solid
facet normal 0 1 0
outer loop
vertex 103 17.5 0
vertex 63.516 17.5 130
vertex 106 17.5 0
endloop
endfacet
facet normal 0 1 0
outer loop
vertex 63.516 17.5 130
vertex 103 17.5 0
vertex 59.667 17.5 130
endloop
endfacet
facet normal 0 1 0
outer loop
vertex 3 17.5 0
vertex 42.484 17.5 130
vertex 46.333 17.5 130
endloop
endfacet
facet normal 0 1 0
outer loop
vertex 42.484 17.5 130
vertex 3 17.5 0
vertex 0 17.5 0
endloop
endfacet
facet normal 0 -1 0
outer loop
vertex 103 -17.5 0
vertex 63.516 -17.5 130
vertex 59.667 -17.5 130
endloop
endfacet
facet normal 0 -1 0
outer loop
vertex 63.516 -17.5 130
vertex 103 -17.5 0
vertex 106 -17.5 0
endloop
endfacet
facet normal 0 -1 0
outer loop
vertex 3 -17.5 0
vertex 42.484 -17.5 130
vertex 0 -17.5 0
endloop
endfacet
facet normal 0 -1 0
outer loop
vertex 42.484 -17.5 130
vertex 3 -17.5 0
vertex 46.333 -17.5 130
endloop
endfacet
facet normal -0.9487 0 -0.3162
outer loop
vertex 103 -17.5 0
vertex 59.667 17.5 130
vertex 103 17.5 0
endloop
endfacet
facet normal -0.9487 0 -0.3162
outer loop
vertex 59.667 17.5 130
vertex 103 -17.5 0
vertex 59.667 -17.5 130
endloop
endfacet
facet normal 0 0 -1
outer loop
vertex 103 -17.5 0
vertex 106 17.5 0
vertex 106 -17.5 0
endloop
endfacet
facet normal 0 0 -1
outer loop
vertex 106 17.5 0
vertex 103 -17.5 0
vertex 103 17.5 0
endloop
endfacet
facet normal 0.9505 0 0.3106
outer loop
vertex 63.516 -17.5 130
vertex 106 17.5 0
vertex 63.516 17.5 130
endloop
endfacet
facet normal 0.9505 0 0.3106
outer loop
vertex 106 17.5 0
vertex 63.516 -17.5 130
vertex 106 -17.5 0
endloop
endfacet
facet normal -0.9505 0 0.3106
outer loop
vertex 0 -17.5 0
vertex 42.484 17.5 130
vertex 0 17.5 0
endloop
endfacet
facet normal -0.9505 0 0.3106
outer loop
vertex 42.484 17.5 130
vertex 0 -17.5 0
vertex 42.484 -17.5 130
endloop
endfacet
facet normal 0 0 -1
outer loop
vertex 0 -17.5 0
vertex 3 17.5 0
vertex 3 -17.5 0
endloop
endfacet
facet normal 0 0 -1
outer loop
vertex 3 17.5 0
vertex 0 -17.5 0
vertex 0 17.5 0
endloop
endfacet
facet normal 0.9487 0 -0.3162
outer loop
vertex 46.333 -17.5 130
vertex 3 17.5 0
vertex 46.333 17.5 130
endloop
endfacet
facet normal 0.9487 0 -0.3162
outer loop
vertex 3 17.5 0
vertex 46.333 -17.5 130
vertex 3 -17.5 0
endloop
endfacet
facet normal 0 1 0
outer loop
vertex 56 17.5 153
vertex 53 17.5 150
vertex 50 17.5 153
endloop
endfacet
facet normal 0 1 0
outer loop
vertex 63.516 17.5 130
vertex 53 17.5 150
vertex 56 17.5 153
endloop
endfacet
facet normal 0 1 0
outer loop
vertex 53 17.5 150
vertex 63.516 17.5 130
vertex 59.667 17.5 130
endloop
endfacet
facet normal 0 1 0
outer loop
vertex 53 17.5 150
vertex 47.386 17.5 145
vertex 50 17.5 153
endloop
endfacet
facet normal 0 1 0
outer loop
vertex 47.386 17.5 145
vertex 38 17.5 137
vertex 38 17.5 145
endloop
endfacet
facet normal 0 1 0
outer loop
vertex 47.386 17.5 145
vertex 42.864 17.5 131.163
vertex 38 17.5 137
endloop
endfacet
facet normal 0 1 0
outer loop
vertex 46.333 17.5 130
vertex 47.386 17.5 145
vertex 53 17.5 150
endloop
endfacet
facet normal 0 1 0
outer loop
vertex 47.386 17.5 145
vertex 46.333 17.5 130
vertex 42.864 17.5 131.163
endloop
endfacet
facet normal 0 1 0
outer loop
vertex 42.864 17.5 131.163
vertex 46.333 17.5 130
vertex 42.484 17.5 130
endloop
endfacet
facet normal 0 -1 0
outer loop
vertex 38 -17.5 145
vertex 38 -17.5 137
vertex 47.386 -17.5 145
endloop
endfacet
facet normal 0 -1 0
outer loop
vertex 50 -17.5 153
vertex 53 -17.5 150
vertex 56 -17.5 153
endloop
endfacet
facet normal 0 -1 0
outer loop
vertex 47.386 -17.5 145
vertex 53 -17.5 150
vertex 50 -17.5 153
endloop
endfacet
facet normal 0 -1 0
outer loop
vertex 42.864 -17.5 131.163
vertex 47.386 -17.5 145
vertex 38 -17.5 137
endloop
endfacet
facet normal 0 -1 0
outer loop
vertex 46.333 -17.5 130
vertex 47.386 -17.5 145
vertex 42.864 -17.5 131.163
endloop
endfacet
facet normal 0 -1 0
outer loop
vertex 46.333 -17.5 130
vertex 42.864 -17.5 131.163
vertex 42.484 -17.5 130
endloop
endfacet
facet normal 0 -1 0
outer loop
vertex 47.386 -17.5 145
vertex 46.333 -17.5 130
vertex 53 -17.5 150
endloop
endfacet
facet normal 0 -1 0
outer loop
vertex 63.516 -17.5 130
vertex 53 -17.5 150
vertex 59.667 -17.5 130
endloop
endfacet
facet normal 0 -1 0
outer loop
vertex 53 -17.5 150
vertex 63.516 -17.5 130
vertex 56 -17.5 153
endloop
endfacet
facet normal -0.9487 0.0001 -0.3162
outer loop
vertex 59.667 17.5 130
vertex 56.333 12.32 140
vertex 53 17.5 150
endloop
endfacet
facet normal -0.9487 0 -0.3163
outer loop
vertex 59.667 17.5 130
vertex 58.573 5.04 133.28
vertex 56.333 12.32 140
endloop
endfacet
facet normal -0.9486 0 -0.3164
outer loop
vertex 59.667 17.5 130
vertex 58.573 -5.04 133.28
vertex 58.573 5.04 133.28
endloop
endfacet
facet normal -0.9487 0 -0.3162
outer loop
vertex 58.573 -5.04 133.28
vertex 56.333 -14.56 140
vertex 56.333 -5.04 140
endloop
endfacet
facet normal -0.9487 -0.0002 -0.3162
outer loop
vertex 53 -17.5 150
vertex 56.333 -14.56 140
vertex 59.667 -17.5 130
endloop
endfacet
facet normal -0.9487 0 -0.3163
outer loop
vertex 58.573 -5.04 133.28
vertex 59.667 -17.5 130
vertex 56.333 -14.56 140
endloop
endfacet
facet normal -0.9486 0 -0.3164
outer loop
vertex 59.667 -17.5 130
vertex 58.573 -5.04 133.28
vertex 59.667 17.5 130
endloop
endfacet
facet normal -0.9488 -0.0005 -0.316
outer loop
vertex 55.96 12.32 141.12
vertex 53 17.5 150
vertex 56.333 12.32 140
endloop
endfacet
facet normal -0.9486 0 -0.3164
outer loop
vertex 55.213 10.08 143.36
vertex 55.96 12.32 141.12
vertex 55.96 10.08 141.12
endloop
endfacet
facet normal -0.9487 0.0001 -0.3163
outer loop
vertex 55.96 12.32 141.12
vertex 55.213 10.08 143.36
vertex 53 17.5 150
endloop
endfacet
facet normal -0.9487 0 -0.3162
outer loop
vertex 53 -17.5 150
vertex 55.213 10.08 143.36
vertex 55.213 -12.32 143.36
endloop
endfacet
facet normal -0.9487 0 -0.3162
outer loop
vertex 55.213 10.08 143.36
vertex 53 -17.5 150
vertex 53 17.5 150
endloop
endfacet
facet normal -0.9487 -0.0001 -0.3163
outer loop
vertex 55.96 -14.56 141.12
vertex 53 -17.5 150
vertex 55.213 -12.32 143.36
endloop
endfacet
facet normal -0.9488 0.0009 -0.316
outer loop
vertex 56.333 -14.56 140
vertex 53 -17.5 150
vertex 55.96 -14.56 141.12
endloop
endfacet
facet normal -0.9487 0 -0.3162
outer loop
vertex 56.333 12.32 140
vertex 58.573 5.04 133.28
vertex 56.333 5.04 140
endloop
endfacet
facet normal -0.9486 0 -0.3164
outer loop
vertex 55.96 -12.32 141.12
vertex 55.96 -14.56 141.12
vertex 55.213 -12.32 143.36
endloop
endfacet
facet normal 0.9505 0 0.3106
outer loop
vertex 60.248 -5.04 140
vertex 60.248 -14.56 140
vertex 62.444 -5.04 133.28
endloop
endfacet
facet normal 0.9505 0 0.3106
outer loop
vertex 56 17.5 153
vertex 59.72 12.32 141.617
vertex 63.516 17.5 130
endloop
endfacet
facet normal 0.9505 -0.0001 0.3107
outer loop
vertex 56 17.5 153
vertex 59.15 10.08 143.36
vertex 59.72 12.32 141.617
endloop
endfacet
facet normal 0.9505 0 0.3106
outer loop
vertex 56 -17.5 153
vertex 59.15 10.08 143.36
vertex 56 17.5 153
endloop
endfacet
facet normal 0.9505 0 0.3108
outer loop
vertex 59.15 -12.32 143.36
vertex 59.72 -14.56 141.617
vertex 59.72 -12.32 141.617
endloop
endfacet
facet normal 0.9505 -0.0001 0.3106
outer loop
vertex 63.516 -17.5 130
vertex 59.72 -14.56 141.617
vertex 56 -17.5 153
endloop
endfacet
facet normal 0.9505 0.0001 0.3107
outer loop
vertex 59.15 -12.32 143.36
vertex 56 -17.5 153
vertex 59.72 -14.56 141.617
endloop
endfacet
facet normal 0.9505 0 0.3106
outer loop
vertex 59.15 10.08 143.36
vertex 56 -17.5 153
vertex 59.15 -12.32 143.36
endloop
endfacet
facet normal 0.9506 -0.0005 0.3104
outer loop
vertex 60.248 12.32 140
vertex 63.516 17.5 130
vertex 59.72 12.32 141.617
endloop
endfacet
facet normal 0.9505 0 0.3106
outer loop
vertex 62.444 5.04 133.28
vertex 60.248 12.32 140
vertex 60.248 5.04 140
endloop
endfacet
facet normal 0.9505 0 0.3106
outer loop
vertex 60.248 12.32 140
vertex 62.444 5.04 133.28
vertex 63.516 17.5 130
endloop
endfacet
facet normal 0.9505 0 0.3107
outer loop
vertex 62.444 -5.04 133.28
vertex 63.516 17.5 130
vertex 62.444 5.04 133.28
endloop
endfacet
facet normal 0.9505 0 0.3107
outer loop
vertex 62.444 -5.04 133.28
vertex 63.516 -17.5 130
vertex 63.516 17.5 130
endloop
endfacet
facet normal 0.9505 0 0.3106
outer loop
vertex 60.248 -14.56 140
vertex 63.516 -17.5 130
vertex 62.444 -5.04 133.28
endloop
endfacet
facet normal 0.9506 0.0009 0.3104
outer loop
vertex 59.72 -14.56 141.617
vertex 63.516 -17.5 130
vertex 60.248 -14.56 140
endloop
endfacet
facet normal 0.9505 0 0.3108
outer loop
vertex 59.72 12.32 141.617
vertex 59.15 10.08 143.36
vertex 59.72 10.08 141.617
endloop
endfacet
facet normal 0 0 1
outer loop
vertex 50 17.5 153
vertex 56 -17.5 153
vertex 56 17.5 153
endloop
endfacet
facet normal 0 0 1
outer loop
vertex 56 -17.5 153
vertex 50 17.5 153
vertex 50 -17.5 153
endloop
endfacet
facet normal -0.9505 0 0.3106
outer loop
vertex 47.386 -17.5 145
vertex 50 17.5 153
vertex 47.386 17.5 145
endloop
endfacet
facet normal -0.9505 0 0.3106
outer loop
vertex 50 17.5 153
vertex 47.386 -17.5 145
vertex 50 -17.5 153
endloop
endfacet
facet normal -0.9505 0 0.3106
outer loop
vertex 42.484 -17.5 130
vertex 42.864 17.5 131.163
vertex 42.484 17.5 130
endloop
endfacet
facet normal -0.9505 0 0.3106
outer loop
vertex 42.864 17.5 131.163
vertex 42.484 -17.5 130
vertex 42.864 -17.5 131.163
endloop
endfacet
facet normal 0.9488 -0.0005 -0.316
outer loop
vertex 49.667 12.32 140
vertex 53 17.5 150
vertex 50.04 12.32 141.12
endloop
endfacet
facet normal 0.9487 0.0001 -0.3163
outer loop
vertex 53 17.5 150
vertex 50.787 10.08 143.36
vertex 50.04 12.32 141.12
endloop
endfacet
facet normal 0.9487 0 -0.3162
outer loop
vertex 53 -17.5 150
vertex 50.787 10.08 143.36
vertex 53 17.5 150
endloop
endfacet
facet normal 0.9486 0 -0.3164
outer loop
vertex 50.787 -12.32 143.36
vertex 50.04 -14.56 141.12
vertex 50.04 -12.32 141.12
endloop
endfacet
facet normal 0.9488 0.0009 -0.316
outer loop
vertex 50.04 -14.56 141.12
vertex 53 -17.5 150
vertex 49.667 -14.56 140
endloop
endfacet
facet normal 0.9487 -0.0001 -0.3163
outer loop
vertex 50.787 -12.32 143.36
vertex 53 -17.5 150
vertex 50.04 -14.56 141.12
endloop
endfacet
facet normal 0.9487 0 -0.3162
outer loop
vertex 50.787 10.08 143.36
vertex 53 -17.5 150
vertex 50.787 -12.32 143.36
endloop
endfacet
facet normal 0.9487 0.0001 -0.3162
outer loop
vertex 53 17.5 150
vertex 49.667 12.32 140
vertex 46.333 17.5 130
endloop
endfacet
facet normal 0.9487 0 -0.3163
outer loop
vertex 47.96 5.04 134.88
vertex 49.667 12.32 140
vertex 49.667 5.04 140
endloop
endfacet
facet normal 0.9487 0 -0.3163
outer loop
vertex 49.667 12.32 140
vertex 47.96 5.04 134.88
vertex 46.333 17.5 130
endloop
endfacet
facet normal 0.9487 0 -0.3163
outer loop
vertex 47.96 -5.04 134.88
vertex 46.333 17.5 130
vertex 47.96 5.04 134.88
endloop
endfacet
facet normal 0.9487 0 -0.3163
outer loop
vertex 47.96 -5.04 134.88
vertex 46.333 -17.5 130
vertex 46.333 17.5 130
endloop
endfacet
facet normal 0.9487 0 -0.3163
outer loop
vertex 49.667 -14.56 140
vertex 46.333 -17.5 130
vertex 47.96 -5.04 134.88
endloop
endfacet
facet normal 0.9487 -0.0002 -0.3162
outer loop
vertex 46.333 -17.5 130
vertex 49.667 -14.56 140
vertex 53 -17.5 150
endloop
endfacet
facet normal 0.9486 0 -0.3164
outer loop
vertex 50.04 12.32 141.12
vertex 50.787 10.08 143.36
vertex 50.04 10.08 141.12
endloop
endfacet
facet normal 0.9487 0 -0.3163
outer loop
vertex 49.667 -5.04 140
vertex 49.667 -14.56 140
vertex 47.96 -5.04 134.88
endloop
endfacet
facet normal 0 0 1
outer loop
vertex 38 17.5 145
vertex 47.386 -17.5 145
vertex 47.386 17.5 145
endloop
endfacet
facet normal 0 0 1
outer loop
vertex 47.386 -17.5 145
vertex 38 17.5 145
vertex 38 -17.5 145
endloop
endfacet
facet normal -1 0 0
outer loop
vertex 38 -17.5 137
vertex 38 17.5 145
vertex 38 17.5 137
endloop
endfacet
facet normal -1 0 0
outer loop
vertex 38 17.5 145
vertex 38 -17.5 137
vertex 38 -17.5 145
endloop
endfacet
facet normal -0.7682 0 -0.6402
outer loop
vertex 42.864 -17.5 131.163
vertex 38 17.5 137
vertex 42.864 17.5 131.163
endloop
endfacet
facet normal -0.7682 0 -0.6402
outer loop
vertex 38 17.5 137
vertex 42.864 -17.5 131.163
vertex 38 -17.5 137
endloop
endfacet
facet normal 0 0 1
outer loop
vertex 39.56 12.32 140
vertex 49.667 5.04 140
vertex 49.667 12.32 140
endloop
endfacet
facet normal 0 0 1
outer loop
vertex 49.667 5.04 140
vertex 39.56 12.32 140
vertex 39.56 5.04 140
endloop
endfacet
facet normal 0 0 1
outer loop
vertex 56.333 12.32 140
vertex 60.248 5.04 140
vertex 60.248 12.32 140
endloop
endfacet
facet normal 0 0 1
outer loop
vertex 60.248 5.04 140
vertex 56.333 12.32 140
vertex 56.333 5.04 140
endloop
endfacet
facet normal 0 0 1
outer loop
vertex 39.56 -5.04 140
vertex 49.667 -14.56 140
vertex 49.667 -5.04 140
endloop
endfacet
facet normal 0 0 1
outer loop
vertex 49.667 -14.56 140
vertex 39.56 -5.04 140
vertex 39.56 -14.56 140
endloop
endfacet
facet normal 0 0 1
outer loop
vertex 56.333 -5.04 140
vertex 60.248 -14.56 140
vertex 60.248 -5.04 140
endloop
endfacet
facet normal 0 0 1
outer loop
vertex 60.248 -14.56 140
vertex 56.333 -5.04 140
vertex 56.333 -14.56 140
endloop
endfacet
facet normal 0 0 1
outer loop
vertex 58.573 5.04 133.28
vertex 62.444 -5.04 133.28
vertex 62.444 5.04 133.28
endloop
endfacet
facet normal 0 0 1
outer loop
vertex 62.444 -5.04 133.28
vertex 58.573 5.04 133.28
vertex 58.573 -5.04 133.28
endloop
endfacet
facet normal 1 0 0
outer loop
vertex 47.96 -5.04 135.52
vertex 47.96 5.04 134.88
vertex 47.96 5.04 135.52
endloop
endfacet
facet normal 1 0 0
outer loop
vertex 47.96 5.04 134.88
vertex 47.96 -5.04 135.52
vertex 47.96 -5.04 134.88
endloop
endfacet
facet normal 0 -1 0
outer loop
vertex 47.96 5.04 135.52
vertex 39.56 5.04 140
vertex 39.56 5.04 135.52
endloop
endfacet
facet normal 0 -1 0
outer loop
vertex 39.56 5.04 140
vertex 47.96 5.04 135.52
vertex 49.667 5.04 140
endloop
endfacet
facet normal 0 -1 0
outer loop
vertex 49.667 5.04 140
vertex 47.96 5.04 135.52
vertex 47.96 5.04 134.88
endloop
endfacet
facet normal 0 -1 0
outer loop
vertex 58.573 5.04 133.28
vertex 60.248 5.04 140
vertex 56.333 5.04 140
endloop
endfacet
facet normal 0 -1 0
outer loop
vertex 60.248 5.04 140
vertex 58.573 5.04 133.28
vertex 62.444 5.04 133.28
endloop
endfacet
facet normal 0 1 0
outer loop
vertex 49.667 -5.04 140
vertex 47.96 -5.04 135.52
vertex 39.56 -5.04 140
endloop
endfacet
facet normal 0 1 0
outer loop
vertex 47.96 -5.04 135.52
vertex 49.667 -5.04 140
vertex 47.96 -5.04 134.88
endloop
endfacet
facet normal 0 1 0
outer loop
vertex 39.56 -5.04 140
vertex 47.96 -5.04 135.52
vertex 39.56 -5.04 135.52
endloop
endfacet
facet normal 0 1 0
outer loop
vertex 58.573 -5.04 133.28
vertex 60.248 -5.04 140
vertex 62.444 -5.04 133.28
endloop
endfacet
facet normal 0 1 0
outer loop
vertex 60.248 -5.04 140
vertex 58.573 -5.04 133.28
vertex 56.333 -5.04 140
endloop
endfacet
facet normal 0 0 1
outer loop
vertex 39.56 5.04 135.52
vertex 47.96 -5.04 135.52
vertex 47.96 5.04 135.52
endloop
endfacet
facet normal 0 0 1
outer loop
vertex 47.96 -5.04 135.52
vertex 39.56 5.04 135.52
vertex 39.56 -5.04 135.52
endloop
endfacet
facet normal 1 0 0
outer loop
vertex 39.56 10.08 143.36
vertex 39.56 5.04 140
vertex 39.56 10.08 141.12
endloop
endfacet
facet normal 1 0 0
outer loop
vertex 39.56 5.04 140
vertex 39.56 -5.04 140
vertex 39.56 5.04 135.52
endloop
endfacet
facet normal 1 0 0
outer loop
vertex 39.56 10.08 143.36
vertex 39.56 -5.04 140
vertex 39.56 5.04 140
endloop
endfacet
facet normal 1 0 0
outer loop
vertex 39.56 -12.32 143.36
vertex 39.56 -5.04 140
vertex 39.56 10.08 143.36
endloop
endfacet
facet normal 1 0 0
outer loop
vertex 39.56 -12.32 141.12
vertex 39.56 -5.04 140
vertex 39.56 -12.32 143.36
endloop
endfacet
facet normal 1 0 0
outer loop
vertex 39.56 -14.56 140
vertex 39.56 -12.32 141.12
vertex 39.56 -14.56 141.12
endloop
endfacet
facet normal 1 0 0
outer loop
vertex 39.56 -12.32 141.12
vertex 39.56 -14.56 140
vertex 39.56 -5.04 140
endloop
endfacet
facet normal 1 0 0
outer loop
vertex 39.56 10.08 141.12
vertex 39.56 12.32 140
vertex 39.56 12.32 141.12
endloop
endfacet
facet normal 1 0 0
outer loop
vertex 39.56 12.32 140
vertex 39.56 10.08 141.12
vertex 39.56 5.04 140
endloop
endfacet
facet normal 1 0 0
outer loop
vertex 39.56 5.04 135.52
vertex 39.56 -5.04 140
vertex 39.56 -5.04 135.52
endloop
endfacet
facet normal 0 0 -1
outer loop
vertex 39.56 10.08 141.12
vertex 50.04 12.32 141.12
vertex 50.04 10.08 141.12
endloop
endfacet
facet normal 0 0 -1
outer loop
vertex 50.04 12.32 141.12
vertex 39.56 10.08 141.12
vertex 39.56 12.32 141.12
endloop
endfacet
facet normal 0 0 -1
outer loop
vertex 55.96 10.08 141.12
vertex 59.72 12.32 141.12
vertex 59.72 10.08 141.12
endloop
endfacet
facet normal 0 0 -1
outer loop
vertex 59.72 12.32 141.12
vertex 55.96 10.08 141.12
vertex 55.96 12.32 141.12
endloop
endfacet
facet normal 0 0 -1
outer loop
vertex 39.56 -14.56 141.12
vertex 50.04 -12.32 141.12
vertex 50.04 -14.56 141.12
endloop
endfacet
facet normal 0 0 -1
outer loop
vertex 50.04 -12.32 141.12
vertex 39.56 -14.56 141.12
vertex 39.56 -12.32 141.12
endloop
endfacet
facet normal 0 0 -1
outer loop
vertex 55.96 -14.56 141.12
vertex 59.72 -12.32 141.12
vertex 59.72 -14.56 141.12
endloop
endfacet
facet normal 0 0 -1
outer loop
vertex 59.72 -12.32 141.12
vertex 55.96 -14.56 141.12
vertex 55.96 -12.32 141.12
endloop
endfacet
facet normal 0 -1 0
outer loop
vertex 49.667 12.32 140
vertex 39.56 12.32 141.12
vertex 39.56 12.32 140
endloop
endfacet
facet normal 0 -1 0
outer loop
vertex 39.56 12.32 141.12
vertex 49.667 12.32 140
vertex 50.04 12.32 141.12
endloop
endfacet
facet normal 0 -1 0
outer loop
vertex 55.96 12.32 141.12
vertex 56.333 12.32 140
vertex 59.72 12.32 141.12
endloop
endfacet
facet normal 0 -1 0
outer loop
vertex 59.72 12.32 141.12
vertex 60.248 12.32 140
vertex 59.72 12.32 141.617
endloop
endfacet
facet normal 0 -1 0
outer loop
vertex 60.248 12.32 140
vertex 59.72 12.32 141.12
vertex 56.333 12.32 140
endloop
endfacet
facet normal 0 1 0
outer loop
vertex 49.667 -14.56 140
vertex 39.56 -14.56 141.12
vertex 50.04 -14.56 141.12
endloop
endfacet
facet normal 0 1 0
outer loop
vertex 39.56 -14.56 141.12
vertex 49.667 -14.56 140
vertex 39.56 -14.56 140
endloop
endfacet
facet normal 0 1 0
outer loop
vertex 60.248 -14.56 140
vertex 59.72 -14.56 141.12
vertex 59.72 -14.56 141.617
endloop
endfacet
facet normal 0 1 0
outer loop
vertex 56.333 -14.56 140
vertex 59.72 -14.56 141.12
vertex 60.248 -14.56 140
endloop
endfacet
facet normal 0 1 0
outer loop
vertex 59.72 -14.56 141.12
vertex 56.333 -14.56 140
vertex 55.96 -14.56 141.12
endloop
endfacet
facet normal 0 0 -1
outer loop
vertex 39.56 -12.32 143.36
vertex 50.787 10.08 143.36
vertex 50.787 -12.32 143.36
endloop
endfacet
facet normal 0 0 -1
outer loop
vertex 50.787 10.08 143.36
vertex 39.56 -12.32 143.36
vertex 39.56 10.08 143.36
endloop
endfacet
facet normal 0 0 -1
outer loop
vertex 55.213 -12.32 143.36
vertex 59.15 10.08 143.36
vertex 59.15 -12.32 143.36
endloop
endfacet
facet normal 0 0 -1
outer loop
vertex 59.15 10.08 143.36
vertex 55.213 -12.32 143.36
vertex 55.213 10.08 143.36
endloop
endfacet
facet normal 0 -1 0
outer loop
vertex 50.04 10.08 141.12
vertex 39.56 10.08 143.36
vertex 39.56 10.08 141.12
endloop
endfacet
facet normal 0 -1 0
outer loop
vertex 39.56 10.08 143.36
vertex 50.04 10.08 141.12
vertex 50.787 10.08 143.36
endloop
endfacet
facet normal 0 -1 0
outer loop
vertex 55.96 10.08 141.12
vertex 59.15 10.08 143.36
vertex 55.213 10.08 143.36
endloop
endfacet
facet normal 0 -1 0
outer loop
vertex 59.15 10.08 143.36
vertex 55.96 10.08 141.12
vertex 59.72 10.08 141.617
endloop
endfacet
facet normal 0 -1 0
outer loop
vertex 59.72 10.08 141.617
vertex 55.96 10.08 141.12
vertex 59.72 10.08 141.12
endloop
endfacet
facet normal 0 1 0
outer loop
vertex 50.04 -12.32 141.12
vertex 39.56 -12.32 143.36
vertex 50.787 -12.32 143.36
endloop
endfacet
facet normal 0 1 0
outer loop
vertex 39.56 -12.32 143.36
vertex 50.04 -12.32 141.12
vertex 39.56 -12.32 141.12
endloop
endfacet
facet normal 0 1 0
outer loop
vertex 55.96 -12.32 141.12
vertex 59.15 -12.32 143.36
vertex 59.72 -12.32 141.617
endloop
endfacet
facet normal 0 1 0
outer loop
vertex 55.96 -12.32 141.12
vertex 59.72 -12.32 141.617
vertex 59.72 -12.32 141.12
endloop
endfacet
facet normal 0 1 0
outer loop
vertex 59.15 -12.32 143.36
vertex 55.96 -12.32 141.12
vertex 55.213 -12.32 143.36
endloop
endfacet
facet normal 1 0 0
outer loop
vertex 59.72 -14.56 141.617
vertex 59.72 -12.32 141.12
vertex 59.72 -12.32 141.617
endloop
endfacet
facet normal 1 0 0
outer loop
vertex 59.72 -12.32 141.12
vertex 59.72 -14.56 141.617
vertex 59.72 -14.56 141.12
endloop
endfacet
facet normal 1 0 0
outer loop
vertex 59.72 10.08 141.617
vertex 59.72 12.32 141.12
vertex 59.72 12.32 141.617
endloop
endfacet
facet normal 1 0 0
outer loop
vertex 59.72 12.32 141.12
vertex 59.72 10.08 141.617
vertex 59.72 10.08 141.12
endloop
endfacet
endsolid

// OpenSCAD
// file: picam_slot.scad
module PicamV13(){
    thickness = 1;
    length = 24;
    width = 24;
    components_offset_width = 2;
    components_height = 2;
    components_width = 20;
    components_length = 20;
    plug_width = width;
    plug_length = 6;
    plug_height = 3;
    plug_offset_length = length - plug_length;
    plug_offset_width = 0;
    cam_sidelength = 9;
    cam_height = 6;
    cam_offset_width = 13-cam_sidelength/2;
    cam_offset_length = 12-cam_sidelength/2;
    
    translate([-cam_offset_length-cam_sidelength/2,-cam_offset_width-cam_sidelength/2,0])
    union(){
        cube([length, width, thickness]);
    
        translate([0, components_offset_width, thickness])
        color("blue", 1)
        cube([components_length, components_width, components_height]);
        
        translate([cam_offset_length,cam_offset_width,-cam_height])
        color("red", 1)
        union(){
            cube([cam_sidelength+7.5, cam_sidelength, cam_height]);
            translate([-7.5,0,2])
            cube([7.5, cam_sidelength, 4]);
        }
        
        translate([plug_offset_length,plug_offset_width,thickness])
        color("green", 1)
        cube([plug_length, plug_width, plug_height]);
    }
}


module straight_arch(){
    s = 100;
    w = 3;
    hc = 150;
    l = 35;
    cut = 130;
    translate([-s/2,0,-cut])
    difference(){
        translate([0,l/2])
        rotate([90,0,0])
        linear_extrude(l)
        polygon([[-w,0], [0,0], [s/2,hc], [s,0], 
             [s+w,0], [s/2+w,hc+w], [s/2-w,hc+w]]);
        
        translate([-200,-200])
        cube([500,500,cut]);
    }
}

module Cam_Top(){
    difference(){
        l = 35;
        w = 10;
        h = 8;
        union(){
            straight_arch();
            translate([-w-5,-l/2,h-1])
            color("orange", 1)
            union(){
                difference(){
                    cube([w,l,h]);
                    //translate([2,15,h-1])
                    //linear_extrude(1)
                    //text("x");
                }
                translate([h,l,-h])
                rotate([90,-90])
                linear_extrude(l)
                polygon([[2,3], [h,h], [h,0]]);
            }
        }
        sc = 1.12;
        translate([0,0,10])
        scale([sc,sc,sc])
        PicamV13();
    }
}

Cam_Top();
//PicamV13();
// file: config.scad
plate_sidelength = 100;
//hole_radius = 25/6;
gridsize = plate_sidelength/(4*10-1);
plate_thickness = 3;
bot_plate_maze_space = 10;
wall_height = 6;
hole_out_r = 4;
slide_width = 8;
camera_height = 150;
holder_wall_width = 35;
camera_width = 10;
fn = 100;

box_height = 90; // change
box_shift = 0;
box_width = 72;
box_width1 = box_width + box_shift;
servo_h_offset = 18; // change
h_clip = 30; // change
max_angle = 20;
w_arm = 17 - plate_thickness;
w_arm_full = w_arm + box_width/2;
pivot_offset = 15; // 0 would be in the middle

clip_cutout_w = 2;
clip_scale = 46/h_clip;


hole_coords = [[0,0], [6,0], [8,1], [6,2], [1,3], [3,4], [6,4], [2,5], [5,5], [2,6], [9,6], [1,7], [4,8], [8,8], [1,8], [5,8], [8,3]];
wall_coords_h = [[0,3], [0,5], [1,1], [1,3], [1,4], [1,6], [2,1], [2,4], [2,5], [2,6], [3,1], [3,8], [4,1], [4,2], [4,5], [5,1], [5,3], [5,7], [6,1], [6,7], [7,1], [7,7], [8,1], [8,4], [5,6], [6,6], [7,5]];
wall_coords_v = [[0,7], [0,8], [0,9], [1,1], [2,0], [2,2], [2,3], [3,6], [3,7], [4,3], [5,4], [7,5], [7,6], [7,7], [8,2], [8,3], [8,4], [6,9], [4,1], [6,6]];
corner_coords = [[0,3], [0,6], [0,7], [0,8], [1,1], [1,4], [1,6], [2,1], [2,2], [2,3], [3,1], [3,5], [3,6], [3,8], [4,1], [4,2], [4,3], [5,1], [5,3], [5,7], [6,1], [6,7], [7,1], [7,4], [7,5], [7,6], [7,7], [8,1], [8,2], [8,3], [8,4], [2,4], [3,7], [4,5], [5,4], [4,7], [6,5], [6,6], [5,6]];
// main file
include <config.scad>;
use <picam_slot.scad>;

module circ_arch(){
    s = plate_sidelength;
    w = plate_thickness;
    hc = camera_height;
    l = holder_wall_width;
    s1 = s + 2*w;
    scale([1,1,2*hc/s1])
    translate([s1/2,l/2])
    rotate([90,0,0])
    linear_extrude(l)
    difference(){
        half_circle(s1/2);
        half_circle(s1/2-w);
    }
}

module half_circle(radius) {
    rotate(180)
    intersection() {
        circle(radius, $fn=fn);
        translate([-radius, -radius]) square([2 * radius, radius]);
    }
}

module straight_arch(){
    s = plate_sidelength;
    w = plate_thickness;
    hc = camera_height;
    l = holder_wall_width;
    c = camera_width;
    difference(){
        translate([w,l/2])
        rotate([90,0,0])
        linear_extrude(l)
        polygon([[-w,0], [0,0], [s/2,hc], [s,0], 
             [s+w,0], [s/2+w,hc+w], [s/2-w,hc+w]]);
        //translate([s/2+w,0,hc-c])
        //cube([c*4,c,c], center=true);
    }
}

module cam(){
    x = 24;
    y = 27;
    d = 2;
    d_top = 6;
    d_bot = 5;
    d_bot2 = 4;
    x0_top = 5;
    x_top = 16;
    y0_top = 8;
    y_top = 10;
    x0_bot = 0;
    x_bot = 6;
    y0_bot = 2;
    y_bot = 21;
    x0_bot2 = 6;
    x_bot2 = 17;
    y0_bot2 = 2;
    y_bot2 = 22;
    rotate([180])
    translate([0,-1,0])
    union(){
        color([1,0,0]) cube([x,y,d]);
        translate([x0_top, y0_top, d])
        color([0,1,0]) cube([x_top,y_top,d_top]);
        translate([x0_bot, y0_bot, -d_bot])
        color([0,0,1]) cube([x_bot,y_bot,d_bot]);
        translate([x0_bot2, y0_bot2, -d_bot2])
        color([1,1,1]) cube([x_bot2,y_bot2,d_bot2]);
    }
}

module straight_arch_camhole(){
    s = plate_sidelength;
    hc = camera_height;
    scale_fit = 1.05;
    difference(){
        straight_arch();
        translate([s/4,-s/4,hc-20])
        cube([s/2,s/2,100]);
    }
    
    translate([s/4+28,0,hc-20])
    Cam_Top();
    //translate([s/2-12,12.5,hc-4])
    //cam();
}

straight_arch_camhole();
//cam();
